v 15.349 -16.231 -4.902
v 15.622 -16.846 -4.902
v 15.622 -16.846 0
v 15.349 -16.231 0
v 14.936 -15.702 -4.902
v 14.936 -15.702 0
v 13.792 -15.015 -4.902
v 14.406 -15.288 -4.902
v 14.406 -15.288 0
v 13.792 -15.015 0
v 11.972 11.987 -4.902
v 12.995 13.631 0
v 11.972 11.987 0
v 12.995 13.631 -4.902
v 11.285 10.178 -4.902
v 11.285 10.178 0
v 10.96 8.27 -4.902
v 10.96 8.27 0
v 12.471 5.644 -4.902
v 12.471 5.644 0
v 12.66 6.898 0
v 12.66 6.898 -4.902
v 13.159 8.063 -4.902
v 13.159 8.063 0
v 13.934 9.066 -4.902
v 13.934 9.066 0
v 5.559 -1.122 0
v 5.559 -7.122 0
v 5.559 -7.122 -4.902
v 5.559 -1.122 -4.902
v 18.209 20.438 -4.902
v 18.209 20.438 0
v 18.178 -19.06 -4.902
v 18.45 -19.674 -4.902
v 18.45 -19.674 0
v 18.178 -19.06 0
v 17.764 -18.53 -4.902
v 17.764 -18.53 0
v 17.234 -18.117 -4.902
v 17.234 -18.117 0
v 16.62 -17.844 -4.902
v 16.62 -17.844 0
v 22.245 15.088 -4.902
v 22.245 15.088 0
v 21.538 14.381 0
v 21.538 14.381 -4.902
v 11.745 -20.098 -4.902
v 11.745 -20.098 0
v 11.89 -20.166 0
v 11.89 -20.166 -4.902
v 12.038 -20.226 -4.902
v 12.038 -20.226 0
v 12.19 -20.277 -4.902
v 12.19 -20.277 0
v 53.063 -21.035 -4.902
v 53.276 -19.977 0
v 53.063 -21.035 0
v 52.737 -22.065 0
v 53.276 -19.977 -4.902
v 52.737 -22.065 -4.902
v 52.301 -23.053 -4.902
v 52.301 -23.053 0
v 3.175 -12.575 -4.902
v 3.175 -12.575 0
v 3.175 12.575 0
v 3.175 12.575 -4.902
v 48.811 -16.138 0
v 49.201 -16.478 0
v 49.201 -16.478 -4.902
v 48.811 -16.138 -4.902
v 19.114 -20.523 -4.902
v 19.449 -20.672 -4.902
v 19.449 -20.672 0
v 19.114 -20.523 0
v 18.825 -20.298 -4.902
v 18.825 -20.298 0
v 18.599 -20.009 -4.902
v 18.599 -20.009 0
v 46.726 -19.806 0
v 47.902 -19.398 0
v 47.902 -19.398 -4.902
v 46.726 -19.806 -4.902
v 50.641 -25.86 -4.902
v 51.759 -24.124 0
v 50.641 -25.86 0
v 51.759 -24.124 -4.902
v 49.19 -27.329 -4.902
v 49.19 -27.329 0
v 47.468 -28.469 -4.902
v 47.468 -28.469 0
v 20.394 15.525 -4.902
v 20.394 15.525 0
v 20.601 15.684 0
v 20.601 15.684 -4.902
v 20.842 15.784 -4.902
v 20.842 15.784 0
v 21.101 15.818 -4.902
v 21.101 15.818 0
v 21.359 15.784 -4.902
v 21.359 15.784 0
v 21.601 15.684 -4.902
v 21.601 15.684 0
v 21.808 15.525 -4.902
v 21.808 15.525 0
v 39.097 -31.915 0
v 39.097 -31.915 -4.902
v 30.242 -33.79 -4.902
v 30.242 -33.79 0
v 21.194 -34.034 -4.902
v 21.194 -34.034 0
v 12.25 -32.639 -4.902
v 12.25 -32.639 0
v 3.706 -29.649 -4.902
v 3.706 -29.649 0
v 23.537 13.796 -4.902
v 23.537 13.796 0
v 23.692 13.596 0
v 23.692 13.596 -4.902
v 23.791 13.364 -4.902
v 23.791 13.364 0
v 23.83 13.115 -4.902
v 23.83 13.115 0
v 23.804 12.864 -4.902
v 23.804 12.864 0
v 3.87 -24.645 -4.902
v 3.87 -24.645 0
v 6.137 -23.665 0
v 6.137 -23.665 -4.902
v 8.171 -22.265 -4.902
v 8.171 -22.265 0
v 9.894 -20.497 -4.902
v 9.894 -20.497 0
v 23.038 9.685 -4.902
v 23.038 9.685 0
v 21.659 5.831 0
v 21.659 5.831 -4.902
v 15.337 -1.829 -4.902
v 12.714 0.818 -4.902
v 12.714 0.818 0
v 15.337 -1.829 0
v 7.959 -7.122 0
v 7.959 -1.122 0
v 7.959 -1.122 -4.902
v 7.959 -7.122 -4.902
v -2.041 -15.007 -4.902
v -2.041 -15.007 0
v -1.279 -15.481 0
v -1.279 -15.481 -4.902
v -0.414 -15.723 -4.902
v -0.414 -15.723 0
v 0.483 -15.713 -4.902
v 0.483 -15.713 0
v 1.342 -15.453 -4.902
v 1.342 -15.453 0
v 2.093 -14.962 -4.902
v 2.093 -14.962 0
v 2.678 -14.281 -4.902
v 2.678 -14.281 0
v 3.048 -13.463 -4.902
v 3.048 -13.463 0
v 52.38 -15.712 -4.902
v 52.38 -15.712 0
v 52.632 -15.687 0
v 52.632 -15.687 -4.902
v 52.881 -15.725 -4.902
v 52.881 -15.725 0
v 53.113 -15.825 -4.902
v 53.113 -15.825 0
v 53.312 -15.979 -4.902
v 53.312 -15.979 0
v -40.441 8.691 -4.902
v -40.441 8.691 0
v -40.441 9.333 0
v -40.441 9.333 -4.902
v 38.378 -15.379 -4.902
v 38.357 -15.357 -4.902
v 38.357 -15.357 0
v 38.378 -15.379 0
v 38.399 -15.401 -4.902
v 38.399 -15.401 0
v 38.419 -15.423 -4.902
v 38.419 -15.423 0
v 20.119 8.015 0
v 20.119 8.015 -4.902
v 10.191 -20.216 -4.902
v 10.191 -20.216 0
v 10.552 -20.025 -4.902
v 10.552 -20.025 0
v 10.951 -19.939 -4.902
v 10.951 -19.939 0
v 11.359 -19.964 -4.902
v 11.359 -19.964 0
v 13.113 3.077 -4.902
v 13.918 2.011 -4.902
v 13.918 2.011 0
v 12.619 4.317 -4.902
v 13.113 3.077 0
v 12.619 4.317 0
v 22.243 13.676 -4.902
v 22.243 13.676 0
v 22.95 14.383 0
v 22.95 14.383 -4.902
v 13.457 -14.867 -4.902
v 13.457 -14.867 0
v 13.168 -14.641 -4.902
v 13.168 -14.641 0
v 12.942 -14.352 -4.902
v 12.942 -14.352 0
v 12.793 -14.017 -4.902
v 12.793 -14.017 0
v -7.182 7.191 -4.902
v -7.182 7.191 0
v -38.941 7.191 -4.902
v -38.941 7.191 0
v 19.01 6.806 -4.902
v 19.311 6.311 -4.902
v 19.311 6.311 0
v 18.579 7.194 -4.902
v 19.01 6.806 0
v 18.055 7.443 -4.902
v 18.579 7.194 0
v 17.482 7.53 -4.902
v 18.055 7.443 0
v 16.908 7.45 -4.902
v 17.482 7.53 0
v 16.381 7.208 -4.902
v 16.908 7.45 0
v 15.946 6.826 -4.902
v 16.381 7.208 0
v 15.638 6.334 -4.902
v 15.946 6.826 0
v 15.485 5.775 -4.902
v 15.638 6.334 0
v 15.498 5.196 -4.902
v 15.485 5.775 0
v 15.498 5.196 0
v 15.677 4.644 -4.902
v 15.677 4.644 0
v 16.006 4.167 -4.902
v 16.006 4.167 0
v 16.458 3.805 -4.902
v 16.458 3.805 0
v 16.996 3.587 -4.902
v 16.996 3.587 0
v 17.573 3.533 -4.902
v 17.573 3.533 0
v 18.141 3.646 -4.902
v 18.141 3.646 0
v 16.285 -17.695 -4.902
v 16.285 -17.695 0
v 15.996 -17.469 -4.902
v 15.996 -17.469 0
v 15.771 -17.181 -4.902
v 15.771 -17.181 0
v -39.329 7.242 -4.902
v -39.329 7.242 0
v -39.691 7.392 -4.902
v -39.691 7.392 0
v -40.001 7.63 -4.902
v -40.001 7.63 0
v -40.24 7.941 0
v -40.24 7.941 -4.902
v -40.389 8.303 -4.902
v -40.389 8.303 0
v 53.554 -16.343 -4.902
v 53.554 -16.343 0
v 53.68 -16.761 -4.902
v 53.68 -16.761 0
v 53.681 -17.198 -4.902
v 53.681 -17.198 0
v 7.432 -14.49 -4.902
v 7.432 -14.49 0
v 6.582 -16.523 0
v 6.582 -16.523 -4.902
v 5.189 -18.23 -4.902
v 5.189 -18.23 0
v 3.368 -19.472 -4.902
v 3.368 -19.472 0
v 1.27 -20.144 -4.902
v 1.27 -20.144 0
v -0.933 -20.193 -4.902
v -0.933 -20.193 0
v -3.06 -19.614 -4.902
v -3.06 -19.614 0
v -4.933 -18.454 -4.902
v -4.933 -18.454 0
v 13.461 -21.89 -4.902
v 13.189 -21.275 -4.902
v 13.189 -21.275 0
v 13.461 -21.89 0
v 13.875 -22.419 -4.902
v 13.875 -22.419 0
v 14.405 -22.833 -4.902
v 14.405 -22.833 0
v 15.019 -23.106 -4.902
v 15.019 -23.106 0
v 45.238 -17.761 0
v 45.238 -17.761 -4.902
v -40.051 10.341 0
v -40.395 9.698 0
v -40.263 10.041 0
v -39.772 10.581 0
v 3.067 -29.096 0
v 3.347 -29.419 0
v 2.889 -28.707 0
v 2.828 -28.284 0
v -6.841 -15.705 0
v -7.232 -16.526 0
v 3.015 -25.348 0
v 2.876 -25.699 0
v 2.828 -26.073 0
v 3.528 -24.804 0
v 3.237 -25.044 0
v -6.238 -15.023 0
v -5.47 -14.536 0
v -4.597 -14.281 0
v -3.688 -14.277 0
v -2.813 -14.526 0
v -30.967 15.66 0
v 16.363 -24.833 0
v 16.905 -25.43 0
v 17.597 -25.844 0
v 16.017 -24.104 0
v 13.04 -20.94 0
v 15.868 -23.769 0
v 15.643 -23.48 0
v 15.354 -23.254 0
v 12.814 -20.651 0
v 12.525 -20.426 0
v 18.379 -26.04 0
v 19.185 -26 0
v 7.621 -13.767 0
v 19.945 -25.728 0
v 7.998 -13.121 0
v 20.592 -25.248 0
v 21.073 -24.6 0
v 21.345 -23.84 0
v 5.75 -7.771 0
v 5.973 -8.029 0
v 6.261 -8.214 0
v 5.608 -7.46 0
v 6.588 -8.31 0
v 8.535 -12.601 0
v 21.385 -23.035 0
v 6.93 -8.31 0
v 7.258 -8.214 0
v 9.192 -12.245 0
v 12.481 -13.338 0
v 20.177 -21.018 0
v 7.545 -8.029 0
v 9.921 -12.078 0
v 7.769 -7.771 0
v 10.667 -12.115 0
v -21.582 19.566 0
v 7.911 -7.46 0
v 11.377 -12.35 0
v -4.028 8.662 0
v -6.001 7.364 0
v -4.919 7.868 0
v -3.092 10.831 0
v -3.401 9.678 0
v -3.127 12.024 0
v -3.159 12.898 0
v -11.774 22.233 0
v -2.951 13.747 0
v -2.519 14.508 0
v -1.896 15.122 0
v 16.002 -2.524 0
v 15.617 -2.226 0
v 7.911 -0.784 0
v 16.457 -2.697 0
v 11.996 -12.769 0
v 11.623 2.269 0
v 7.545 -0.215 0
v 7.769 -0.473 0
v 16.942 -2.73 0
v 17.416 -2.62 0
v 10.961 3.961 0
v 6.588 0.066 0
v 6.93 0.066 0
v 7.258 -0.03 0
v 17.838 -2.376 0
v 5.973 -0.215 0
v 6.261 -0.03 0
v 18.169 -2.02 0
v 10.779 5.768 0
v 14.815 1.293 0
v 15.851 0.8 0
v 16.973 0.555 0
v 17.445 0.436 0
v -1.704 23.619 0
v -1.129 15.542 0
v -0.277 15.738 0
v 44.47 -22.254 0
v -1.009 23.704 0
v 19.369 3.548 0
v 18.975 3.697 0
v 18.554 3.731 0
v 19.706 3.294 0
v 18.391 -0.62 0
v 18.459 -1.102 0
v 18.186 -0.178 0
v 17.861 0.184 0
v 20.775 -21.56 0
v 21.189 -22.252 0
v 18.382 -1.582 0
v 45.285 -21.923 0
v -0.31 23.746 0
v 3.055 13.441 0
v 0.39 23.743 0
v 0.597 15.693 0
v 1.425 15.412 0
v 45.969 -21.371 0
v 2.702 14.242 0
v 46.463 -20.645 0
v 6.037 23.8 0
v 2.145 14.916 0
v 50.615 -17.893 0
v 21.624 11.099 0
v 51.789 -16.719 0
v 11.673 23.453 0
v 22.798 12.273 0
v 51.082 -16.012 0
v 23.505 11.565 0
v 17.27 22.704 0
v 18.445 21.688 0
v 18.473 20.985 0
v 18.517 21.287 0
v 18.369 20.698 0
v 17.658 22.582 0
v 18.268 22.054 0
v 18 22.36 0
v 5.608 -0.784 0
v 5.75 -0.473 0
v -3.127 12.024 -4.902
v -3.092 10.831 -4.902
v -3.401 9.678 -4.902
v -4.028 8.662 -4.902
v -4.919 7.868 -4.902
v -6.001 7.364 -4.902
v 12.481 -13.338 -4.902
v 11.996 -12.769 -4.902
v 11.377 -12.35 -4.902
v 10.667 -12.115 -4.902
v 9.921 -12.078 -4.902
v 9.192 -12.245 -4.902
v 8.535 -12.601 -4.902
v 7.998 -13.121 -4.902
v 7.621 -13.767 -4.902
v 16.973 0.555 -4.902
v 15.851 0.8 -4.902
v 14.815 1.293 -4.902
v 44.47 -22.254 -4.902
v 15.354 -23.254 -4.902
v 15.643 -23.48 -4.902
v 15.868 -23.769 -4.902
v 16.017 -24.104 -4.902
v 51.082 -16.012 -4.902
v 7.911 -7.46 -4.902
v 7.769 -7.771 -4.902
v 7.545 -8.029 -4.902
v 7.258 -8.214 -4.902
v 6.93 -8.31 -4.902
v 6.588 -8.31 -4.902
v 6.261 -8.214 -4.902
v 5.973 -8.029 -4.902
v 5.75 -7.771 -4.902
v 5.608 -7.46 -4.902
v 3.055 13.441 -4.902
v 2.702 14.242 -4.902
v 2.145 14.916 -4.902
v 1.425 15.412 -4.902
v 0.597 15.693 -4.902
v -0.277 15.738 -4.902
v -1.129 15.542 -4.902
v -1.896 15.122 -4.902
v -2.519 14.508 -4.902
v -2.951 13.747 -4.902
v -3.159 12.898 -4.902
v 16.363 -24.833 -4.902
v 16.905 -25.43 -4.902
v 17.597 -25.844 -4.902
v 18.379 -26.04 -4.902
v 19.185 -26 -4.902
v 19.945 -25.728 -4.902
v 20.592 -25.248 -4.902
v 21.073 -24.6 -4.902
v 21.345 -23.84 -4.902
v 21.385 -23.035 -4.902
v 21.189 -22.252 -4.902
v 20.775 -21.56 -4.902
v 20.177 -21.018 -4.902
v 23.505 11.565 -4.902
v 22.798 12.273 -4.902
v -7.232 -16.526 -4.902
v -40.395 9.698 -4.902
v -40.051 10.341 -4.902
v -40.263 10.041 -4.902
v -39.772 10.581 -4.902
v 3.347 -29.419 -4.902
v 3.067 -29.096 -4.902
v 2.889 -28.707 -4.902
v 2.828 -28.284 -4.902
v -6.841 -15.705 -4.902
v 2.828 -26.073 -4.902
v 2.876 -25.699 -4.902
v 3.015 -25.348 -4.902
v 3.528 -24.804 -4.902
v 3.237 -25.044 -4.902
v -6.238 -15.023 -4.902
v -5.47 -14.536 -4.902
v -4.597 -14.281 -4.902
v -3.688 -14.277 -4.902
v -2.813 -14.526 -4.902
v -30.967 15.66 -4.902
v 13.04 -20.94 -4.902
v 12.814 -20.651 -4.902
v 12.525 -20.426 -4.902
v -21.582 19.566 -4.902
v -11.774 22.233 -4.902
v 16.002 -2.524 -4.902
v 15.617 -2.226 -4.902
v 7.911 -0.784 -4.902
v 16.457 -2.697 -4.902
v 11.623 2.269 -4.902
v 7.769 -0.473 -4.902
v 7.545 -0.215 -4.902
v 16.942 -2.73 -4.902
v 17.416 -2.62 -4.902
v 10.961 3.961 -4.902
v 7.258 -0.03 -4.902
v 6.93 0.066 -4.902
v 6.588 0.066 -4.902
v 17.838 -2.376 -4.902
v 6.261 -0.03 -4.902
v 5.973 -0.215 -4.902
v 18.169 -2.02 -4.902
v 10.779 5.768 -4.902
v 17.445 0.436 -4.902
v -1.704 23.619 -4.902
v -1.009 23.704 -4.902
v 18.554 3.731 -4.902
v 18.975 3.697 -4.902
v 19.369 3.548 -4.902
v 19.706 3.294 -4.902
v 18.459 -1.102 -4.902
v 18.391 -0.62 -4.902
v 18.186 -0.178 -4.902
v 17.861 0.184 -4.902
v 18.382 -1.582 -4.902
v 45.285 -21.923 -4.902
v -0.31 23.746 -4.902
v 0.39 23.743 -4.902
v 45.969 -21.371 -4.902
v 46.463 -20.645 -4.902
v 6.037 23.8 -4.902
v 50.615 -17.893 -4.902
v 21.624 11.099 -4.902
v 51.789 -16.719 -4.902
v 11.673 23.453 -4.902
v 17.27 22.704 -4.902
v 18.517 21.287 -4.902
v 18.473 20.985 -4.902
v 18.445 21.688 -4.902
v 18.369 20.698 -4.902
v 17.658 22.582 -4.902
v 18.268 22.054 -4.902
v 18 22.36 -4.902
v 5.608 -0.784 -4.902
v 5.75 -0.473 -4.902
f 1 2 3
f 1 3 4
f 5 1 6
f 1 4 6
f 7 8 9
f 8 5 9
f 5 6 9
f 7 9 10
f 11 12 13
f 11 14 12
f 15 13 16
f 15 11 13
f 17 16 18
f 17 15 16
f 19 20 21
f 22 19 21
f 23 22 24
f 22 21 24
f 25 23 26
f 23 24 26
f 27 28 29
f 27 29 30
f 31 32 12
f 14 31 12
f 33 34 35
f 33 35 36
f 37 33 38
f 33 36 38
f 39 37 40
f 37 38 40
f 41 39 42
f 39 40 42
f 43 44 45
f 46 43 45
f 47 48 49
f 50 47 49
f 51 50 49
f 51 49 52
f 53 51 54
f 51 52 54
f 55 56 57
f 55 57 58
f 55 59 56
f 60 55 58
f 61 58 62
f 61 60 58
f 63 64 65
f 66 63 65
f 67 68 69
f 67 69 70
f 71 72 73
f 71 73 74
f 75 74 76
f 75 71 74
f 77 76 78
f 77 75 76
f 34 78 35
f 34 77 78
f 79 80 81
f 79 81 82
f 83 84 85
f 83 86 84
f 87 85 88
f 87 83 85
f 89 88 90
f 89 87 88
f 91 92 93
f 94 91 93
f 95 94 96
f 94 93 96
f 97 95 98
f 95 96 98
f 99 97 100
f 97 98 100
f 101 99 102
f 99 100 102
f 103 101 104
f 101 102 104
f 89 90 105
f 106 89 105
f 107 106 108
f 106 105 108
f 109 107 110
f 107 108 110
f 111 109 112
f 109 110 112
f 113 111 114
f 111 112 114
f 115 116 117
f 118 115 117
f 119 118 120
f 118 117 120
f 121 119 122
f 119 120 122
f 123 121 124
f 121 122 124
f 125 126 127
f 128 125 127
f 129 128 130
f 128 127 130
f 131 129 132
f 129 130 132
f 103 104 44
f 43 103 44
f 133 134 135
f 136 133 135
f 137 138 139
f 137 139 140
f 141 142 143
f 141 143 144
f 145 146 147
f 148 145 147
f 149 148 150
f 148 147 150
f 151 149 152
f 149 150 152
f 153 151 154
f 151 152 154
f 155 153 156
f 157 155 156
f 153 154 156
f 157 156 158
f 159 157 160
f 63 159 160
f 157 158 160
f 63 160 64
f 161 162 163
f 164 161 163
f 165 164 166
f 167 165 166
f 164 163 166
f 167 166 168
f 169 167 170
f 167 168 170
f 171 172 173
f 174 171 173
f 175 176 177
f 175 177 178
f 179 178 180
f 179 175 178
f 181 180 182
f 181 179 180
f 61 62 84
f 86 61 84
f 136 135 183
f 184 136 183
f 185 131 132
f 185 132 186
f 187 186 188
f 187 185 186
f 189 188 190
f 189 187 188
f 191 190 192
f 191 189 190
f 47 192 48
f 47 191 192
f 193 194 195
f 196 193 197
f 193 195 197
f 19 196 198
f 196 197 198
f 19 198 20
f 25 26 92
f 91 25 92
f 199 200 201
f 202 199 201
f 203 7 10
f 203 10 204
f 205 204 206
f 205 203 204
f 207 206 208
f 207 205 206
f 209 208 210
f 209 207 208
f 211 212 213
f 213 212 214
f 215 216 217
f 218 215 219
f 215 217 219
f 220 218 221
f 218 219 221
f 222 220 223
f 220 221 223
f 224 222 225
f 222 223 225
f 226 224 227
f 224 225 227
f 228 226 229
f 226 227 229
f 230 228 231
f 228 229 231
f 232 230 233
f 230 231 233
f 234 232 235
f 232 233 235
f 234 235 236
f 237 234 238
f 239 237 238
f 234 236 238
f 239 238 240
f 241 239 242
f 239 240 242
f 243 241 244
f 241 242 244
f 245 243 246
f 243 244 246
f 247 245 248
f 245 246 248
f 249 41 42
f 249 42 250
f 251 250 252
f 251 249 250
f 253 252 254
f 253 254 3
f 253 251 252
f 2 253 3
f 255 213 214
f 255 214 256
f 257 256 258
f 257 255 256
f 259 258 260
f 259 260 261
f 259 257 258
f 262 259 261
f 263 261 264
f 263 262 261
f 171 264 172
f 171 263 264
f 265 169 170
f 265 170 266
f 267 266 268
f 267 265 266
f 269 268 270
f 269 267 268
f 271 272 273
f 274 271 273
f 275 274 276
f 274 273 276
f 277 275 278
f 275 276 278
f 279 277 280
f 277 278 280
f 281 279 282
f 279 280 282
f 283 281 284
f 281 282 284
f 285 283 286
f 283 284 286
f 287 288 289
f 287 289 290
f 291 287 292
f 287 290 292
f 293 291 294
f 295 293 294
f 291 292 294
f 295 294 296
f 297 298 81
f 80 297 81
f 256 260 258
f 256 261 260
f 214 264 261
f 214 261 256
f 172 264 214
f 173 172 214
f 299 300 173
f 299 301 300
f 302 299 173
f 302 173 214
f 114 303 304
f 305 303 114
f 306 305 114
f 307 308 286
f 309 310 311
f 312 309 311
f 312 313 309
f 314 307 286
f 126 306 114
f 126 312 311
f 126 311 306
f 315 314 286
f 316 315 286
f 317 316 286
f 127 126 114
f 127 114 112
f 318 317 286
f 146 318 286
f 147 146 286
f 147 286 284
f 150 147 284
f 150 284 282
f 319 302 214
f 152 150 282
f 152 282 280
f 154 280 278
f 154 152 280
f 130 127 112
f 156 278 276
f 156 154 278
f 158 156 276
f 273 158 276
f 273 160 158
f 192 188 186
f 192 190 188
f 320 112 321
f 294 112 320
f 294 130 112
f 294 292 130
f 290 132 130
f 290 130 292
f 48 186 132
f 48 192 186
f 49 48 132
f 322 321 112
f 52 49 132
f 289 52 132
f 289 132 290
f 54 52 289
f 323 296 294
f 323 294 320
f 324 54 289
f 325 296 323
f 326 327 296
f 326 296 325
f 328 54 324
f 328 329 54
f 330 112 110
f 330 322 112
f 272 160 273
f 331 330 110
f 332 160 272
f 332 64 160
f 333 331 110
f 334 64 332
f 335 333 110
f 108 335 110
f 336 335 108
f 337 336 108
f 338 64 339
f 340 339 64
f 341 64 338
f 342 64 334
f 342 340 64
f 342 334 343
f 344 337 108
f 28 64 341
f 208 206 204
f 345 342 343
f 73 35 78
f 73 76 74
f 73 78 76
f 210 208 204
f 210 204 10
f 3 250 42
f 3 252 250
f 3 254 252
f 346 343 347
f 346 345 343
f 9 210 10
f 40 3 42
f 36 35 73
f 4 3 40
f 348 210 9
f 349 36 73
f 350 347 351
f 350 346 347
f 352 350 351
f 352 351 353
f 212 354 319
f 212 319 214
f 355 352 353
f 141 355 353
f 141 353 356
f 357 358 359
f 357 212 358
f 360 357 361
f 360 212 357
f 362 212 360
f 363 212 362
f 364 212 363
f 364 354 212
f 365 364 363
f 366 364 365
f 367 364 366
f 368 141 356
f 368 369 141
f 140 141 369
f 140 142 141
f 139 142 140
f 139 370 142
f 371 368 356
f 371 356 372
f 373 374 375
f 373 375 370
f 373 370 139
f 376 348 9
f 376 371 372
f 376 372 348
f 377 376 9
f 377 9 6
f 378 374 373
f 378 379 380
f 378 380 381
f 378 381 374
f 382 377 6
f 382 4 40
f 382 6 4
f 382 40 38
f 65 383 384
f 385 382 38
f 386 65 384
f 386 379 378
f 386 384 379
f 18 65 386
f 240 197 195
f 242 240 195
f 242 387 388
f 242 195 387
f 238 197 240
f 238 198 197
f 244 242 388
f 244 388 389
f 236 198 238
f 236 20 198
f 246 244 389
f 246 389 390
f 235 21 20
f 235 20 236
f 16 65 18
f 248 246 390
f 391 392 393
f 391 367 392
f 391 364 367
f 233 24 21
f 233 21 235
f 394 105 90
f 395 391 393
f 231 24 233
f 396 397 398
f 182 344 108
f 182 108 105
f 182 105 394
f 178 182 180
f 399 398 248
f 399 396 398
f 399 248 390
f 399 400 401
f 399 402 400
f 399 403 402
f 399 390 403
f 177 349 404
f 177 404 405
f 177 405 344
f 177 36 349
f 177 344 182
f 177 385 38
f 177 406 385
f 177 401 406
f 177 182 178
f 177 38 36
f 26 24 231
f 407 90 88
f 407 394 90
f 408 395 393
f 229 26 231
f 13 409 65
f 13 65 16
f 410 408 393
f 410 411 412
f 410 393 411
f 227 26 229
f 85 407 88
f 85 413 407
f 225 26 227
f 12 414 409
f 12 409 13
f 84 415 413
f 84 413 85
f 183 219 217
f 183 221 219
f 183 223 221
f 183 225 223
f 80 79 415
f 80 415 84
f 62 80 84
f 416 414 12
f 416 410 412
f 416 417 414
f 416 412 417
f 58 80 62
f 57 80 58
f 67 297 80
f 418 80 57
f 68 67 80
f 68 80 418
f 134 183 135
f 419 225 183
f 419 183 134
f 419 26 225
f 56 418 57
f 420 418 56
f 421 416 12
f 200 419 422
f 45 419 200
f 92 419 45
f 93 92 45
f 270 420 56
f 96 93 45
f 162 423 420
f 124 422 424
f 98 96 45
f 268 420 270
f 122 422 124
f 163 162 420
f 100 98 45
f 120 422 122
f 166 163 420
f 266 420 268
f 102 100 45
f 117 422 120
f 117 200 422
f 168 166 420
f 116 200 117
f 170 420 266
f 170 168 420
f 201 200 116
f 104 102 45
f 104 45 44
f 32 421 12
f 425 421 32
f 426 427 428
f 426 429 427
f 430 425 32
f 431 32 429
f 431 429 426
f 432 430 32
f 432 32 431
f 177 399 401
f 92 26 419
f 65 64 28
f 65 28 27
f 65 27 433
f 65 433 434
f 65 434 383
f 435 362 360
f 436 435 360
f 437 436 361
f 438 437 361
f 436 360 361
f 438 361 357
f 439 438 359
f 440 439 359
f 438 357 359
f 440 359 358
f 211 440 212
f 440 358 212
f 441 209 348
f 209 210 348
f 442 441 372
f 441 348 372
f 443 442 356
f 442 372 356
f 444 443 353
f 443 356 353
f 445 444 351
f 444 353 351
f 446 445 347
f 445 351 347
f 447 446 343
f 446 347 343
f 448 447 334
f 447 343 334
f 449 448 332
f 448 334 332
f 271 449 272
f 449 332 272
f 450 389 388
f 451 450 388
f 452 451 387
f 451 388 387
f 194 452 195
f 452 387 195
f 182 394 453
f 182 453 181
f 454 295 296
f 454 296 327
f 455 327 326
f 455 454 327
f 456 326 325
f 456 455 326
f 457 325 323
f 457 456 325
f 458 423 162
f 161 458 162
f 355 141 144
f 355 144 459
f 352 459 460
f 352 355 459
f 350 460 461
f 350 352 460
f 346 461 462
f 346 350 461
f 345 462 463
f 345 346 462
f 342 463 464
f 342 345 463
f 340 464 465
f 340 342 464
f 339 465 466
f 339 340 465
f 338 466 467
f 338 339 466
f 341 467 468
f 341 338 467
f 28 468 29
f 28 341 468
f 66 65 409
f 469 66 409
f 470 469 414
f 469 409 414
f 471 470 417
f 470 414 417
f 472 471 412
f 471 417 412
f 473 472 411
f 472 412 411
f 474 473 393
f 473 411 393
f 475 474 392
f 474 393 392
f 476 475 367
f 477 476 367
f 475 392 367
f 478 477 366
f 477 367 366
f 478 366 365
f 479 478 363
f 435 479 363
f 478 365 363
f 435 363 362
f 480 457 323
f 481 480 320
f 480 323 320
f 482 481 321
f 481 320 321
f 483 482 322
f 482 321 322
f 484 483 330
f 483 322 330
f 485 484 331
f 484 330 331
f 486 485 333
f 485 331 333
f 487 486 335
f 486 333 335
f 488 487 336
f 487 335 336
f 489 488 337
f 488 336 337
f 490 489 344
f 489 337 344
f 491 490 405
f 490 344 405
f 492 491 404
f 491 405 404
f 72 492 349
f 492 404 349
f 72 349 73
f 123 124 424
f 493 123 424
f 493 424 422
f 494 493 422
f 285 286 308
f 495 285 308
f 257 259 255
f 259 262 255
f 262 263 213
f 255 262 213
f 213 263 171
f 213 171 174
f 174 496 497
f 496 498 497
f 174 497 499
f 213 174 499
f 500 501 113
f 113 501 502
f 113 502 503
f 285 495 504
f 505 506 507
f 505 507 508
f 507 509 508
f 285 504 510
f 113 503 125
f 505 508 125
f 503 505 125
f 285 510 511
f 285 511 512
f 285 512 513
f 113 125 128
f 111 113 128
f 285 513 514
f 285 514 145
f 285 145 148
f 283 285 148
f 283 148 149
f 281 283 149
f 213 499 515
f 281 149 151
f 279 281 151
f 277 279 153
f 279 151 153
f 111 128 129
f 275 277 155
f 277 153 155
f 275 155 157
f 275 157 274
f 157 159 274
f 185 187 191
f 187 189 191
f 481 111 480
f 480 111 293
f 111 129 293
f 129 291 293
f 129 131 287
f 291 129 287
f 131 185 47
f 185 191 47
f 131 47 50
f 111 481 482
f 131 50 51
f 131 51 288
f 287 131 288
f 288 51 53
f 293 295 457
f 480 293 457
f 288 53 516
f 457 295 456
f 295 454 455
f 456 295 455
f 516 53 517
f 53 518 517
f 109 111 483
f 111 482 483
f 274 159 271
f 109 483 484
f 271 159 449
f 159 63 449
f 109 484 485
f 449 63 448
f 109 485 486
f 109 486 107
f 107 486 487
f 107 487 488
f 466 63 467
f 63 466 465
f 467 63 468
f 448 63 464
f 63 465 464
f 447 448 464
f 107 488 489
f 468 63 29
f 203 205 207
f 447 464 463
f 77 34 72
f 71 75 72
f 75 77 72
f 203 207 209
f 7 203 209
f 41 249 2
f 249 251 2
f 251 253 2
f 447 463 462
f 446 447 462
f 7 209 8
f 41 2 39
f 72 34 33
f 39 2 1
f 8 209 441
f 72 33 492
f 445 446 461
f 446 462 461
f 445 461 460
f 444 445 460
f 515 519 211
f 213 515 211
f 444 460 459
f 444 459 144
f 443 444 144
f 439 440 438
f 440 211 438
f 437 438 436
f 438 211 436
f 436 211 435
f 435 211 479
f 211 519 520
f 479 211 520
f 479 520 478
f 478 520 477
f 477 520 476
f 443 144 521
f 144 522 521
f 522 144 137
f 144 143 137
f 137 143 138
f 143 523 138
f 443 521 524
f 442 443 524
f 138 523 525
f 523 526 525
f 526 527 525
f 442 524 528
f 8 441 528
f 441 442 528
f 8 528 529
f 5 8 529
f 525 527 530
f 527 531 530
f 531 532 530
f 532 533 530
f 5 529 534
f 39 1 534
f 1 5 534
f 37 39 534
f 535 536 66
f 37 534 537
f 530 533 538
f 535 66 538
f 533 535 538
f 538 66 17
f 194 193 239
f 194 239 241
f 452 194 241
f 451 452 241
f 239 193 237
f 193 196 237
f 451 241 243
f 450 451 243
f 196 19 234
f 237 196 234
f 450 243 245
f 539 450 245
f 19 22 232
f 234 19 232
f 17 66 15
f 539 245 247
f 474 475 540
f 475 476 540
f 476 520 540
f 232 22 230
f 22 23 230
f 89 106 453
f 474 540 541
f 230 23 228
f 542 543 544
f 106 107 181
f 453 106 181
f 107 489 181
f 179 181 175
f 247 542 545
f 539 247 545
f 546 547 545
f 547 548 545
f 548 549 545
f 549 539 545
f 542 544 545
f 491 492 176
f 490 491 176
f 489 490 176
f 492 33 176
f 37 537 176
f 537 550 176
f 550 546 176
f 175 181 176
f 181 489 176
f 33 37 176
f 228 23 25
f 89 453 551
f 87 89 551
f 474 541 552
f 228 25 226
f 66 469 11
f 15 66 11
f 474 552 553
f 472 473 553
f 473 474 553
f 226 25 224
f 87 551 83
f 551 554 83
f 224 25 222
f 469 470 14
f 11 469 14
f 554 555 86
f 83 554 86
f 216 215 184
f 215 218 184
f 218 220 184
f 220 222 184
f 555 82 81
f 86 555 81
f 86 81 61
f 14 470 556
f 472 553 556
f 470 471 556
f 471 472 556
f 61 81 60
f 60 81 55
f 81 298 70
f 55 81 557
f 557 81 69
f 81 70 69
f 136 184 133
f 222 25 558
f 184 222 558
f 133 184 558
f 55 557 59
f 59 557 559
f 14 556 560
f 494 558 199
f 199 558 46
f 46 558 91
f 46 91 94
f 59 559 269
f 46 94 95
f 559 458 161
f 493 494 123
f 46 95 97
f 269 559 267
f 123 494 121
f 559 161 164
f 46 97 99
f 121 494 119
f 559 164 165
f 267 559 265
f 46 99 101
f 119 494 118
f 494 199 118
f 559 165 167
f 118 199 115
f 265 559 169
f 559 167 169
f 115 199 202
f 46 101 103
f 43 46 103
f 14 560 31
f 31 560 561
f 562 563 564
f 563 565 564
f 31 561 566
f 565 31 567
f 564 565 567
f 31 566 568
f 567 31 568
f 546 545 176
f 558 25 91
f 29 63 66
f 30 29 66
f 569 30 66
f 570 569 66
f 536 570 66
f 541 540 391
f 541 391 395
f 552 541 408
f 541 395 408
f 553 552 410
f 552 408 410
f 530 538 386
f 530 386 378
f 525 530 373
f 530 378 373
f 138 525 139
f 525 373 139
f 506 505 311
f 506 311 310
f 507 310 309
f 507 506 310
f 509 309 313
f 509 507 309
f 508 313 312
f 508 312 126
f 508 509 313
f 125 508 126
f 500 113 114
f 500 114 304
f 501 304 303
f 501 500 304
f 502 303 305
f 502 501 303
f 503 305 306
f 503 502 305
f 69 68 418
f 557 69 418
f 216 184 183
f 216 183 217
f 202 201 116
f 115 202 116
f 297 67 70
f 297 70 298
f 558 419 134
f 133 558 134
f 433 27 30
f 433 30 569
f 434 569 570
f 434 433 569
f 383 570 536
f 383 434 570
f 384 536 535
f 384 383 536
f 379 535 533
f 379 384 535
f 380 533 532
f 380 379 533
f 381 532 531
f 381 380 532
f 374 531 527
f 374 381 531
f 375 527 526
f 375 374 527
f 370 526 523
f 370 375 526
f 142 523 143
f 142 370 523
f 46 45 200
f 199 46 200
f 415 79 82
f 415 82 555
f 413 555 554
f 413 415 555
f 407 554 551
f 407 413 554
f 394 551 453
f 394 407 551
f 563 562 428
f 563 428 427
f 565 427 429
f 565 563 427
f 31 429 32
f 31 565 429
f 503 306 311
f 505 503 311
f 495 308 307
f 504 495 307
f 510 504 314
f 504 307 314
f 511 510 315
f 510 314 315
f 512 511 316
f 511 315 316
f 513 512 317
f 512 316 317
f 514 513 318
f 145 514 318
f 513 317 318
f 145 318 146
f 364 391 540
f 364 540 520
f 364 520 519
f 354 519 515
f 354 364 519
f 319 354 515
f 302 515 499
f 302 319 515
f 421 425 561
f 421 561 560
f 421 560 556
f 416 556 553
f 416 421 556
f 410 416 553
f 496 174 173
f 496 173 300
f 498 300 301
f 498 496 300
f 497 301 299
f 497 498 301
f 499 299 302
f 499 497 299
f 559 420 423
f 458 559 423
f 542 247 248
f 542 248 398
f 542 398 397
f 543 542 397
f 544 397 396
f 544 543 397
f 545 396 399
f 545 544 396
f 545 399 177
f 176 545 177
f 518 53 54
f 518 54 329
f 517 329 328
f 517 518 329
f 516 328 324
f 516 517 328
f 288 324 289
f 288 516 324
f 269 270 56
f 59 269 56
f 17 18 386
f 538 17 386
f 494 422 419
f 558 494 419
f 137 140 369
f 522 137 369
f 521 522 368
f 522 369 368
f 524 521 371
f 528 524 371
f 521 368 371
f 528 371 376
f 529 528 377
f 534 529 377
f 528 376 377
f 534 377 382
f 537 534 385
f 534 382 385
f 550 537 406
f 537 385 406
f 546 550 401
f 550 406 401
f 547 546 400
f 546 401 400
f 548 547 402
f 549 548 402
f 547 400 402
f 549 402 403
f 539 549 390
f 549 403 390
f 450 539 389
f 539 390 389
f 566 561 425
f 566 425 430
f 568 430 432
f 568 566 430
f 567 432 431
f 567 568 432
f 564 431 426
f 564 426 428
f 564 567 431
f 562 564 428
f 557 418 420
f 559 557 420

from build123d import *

# Parameters (mm, degrees)
CART_CLIP_DEPTH                    = 4.9022
DEVICE_CLIP_DEPTH                  = 4.9022
JOINT_DEPTH                        = 4.9022
JOINT_FILLETS_R                    = 1
DEVICE_CLIP_FLEX_RELIEF_GEOMETRY_R = 2
DEVICE_CLIP_FLEX_RELIEF_DEPTH      = 62.785838519
SNAP_IN_RELIEF_DEPTH               = 6.35
BOTTOM_BEEFUP_DEPTH                = 4.9022
CABLE_HOLE_R                       = 2.75
CABLE_HOLE_CUT_DEPTH               = 6.35
SHELF_TAIL_DEPTH                   = 4.9022
FRONT_TAB_BEEF_DEPTH               = 4.9022
TOP_CURVE_EXTRUSION_DEPTH          = 4.9022
LPATTERN1_COUNT                    = 4
LPATTERN1_PITCH                    = 4
POSCON_BOTTOM_SNAPBEEF_DEPTH       = 4.9022
POSCON_TOP_CLIP_FLEX_RELIEF_DEPTH  = 6.35
ZIP_TIE_SLOT_DEPTH                 = 6.35
POSCON_BOTTOM_SNAP_RELIEF_DEPTH    = 6.35
SMALL_START                        = -6
SMALL_FILLET_DEPTH                 = 7
POSCON_TOP_SNAP_RELIEF_DEPTH       = 6.35
LARGE_FILLET_R                     = 10


with BuildPart() as part:
    # Cart Clip Geometry → Cart Clip (new body)
    with BuildSketch(Plane.XY):
        with BuildLine():
            Line((11.175, 4.575), (7.675, -8.575))
            Line((7.675, -8.575), (7.675, -12.575))
            ThreePointArc((7.675, -12.575), (3.243595159, -19.530912266), (-4.933394904, -18.454391101))
            Line((-4.933394904, -18.454391101), (-7.231528234, -16.526028272))
            ThreePointArc((-7.231528234, -16.526028272), (-5.042617938, -14.377626523), (-2.040850661, -15.007191107))
            ThreePointArc((-2.040850661, -15.007191107), (1.341812981, -15.452527224), (3.175, -12.575))
            Line((3.175, -12.575), (3.175, 12.575))
            ThreePointArc((3.175, 12.575), (-0.276719483, 15.737918166), (-3.126764616, 12.023667036))
            ThreePointArc((-3.126764616, 12.023667036), (-5.791346514, 7.43274359), (-10.766819067, 9.282405083))
            Line((-10.766819067, 9.282405083), (-11.00522664, 10.634481615))
            ThreePointArc((-11.00522664, 10.634481615), (-0.973965425, 23.707475751), (11.175, 12.575))
            Line((11.175, 12.575), (11.175, 4.575))
        make_face()
    extrude(amount=-CART_CLIP_DEPTH)



with BuildPart() as body_2:
    # Device Clip Geometry → Device Clip (new body)
    with BuildSketch(Plane.XY):
        with BuildLine():
            Line((22.245178849, 15.087875605), (21.538072068, 14.380768824))
            Line((21.538072068, 14.380768824), (22.243106562, 13.67573433))
            Line((22.243106562, 13.67573433), (22.950213344, 14.382841111))
            Line((22.950213344, 14.382841111), (23.537178094, 13.79587636))
            ThreePointArc((23.537178094, 13.79587636), (23.791320059, 13.364452092), (23.804462509, 12.863910072))
            Line((23.804462509, 12.863910072), (23.504826292, 11.565486463))
            Line((23.504826292, 11.565486463), (22.79771951, 12.272593245))
            Line((22.79771951, 12.272593245), (21.623922254, 11.098795988))
            Line((21.623922254, 11.098795988), (23.038135816, 9.684582425))
            Line((23.038135816, 9.684582425), (21.659277593, 5.830850468))
            Line((21.659277593, 5.830850468), (20.24506403, 7.24506403))
            Line((20.24506403, 7.24506403), (18, 5))
            Line((18, 5), (44.516504294, -21.516504294))
            Line((44.516504294, -21.516504294), (46.761568325, -19.271440264))
            Line((46.761568325, -19.271440264), (45.347354762, -17.857226702))
            Line((45.347354762, -17.857226702), (49.20108672, -16.478368479))
            Line((49.20108672, -16.478368479), (50.615300282, -17.892582041))
            Line((50.615300282, -17.892582041), (51.789097539, -16.718784784))
            Line((51.789097539, -16.718784784), (51.081990758, -16.011678003))
            Line((51.081990758, -16.011678003), (52.380414367, -15.712041786))
            ThreePointArc((52.380414367, -15.712041786), (52.880956387, -15.725184235), (53.312380655, -15.9793262))
            Line((53.312380655, -15.9793262), (53.899345406, -16.566290951))
            Line((53.899345406, -16.566290951), (53.192238624, -17.273397732))
            Line((53.192238624, -17.273397732), (53.897273119, -17.978432226))
            Line((53.897273119, -17.978432226), (54.6043799, -17.271325445))
            Line((54.6043799, -17.271325445), (55.041788732, -17.708734278))
            ThreePointArc((55.041788732, -17.708734278), (55.334681951, -18.415841059), (55.041788732, -19.12294784))
            Line((55.041788732, -19.12294784), (48.582368286, -25.582368286))
            ThreePointArc((48.582368286, -25.582368286), (45.04683438, -27.04683438), (41.511300474, -25.582368286))
            Line((41.511300474, -25.582368286), (13.934136008, 1.99479618))
            ThreePointArc((13.934136008, 1.99479618), (12.469669914, 5.530330086), (13.934136008, 9.065863992))
            Line((13.934136008, 9.065863992), (20.393556454, 15.525284438))
            ThreePointArc((20.393556454, 15.525284438), (21.100663236, 15.818177657), (21.807770017, 15.525284438))
            Line((21.807770017, 15.525284438), (22.245178849, 15.087875605))
        make_face()
    extrude(amount=-DEVICE_CLIP_DEPTH)


with BuildPart() as part_1:
    add(part.part)

    add(body_2.part)  # Joint merges body 2
    # Joint Geometry → Joint (add)
    with BuildSketch(Plane.XY):
        Polygon((7.675, -8.575), (41.511300474, -25.582368286), (13.934136008, 1.99479618), (11.175, 4.575), align=None)
    extrude(amount=-JOINT_DEPTH)

    # joint fillets
    # the kernel refuses this fillet: 1 mm, written as the material it adds along each edge
    with BuildSketch(Plane(origin=(7.675, -8.575, 0), x_dir=(0.8934828469815188, -0.44909731924138613, 0), z_dir=(0, 0, -1))) as joint_fillets_piece_1:
        with BuildLine():
            CenterArc((JOINT_FILLETS_R * 1.62185242183, JOINT_FILLETS_R), JOINT_FILLETS_R, 153.314216372, 116.685783628)
            Line((JOINT_FILLETS_R * 0.728369574849, JOINT_FILLETS_R * 1.44909731924), (0, 0))
            Line((0, 0), (JOINT_FILLETS_R * 1.62185242183, 0))
        make_face()
    extrude(amount=4.9022)
    with BuildSketch(Plane(origin=(41.511300474, -25.582368286, 0), x_dir=(-0.8934828469815294, 0.44909731924136537, 0), z_dir=(0, 0, -1))) as joint_fillets_piece_2:
        with BuildLine():
            CenterArc((0.153680417, -1), JOINT_FILLETS_R, 90, 16.706554242)
            ThreePointArc((-0.133789669, -0.042210383), (-0.066746785, -0.02157445), (0, 0))
            Line((0, 0), (0.153680417, 0))
        make_face()
    extrude(amount=4.9022)
    with BuildSketch(Plane(origin=(13.934136008, 1.99479618, 0), x_dir=(-0.7303933527208762, 0.6830267566509803, 0), z_dir=(0, 0, -1))) as joint_fillets_piece_3:
        with BuildLine():
            CenterArc((4.307177284, 1), JOINT_FILLETS_R, 138.225615508, 131.774384492)
            ThreePointArc((3.561403369, 1.66619912), (1.95135729, 0.468333164), (0, 0))
            Line((0, 0), (4.307177284, 0))
        make_face()
    extrude(amount=4.9022)
    with BuildSketch(Plane(origin=(11.175, 4.575, 0), x_dir=(0, 1, 0), z_dir=(0, 0, -1))) as joint_fillets_piece_4:
        with BuildLine():
            CenterArc((JOINT_FILLETS_R * 0.43397607901, JOINT_FILLETS_R), JOINT_FILLETS_R, 223.080619659, 46.919380341)
            Line((-JOINT_FILLETS_R * 0.296417273711, JOINT_FILLETS_R * 0.316973243349), (0, 0))
            Line((0, 0), (JOINT_FILLETS_R * 0.43397607901, 0))
        make_face()
    extrude(amount=4.9022)

    # Device Clip Flex Relief Geometry → Device Clip Flex Relief (cut, through all)
    with BuildSketch(Plane.XY):
        with Locations((17.469669914, 5.530330086)):
            Circle(DEVICE_CLIP_FLEX_RELIEF_GEOMETRY_R)
    extrude(amount=-DEVICE_CLIP_FLEX_RELIEF_DEPTH, mode=Mode.SUBTRACT)

    # Sketch5 → SNAP IN RELIEF (cut)
    with BuildSketch(Plane.XY):
        with BuildLine():
            Line((44.470063399, -22.25362726), (38.389074456, -15.389074456))
            Line((38.389074456, -15.389074456), (46.761568325, -19.271440264))
            ThreePointArc((46.761568325, -19.271440264), (46.141143244, -21.16619399), (44.470063399, -22.25362726))
        make_face()
    extrude(amount=-SNAP_IN_RELIEF_DEPTH, mode=Mode.SUBTRACT)

    # BOTTOM BEEFUP SKETCH → BOTTOM BEEFUP (add)
    with BuildSketch(Plane.XY):
        with BuildLine():
            Line((10.677043667, -13.889484035), (7.526361766, -14.078164518))
            Line((7.526361766, -14.078164518), (7.208614318, -8.772257329))
            Line((7.208614318, -8.772257329), (10.675, -9.282514389))
            Line((10.675, -9.282514389), (44.278748713, -25.488746112))
            Line((44.278748713, -25.488746112), (53.899345406, -16.566290951))
            Line((53.899345406, -16.566290951), (55.041788732, -17.708734278))
            ThreePointArc((55.041788732, -17.708734278), (55.966427661, -19.737585883), (55.333281386, -21.875416975))
            Line((55.333281386, -21.875416975), (50.398436239, -26.810262122))
            ThreePointArc((50.398436239, -26.810262122), (26.922067406, -34.071170743), (2.828292768, -29.238913377))
            Line((2.828292768, -29.238913377), (2.828292768, -24.930419257))
            ThreePointArc((2.828292768, -24.930419257), (8.371790669, -22.091761318), (11.894021473, -16.955397036))
            Line((11.894021473, -16.955397036), (10.677043667, -13.889484035))
        make_face()
    extrude(amount=-BOTTOM_BEEFUP_DEPTH)

    # CABLE HOLE → CABLE HOLE CUT (cut)
    with BuildSketch(Plane.XY):
        with Locations((10.162604388, -14.817796793)):
            Circle(CABLE_HOLE_R)
    cable_hole_cut = extrude(amount=-CABLE_HOLE_CUT_DEPTH, mode=Mode.SUBTRACT)

    # BOX SLIDE BEEF → SHELF TAIL (add)
    with BuildSketch(Plane.XY):
        Polygon((-7.182015159, 7.190807632), (-40.440555285, 7.190807632), (-40.440555285, 10.131018627), (-4.155347731, 22.948702822), align=None)
    extrude(amount=-SHELF_TAIL_DEPTH)

    # BEHIND TOP CLIP BEEF SKETCH → FRONT TAB BEEF (add)
    with BuildSketch(Plane.XY):
        Polygon((18.518382836, 20.841188896), (11.175, 11.254753066), (0.590090247, 23.734409415), (18.518382836, 22.48088631), align=None)
    extrude(amount=-FRONT_TAB_BEEF_DEPTH)

    # TOP CURVE → TOP CURVE EXTRUSION (add)
    with BuildSketch(Plane.XY):
        with BuildLine():
            Line((-40.440555285, 10.131018627), (-38.751141722, 8.751938886))
            Line((-38.751141722, 8.751938886), (0, 16.86846238))
            Line((0, 16.86846238), (13.175622622, 16.86846238))
            Line((13.175622622, 16.86846238), (18.518382836, 22.48088631))
            ThreePointArc((18.518382836, 22.48088631), (-12.184902527, 22.148517873), (-40.440555285, 10.131018627))
        make_face()
    extrude(amount=-TOP_CURVE_EXTRUSION_DEPTH)

    # LPattern1: CABLE HOLE CUT ×4
    with Locations(*[Vector(0.7071067811865482, -0.7071067811865469, 0) * (i * LPATTERN1_PITCH) for i in range(1, LPATTERN1_COUNT)]):
        add(cable_hole_cut, mode=Mode.SUBTRACT)

    # Sketch13 → POSCON BOTTOM SNAPBEEF (add)
    with BuildSketch(Plane.XY):
        Polygon((49.20108672, -16.478368479), (48.811303545, -16.138109098), (45.23751859, -17.761345734), (45.347354762, -17.857226702), align=None)
    extrude(amount=-POSCON_BOTTOM_SNAPBEEF_DEPTH)

    # Sketch14 → POSCON TOP CLIP FLEX RELIEF (cut)
    with BuildSketch(Plane.XY):
        with BuildLine():
            Line((12.714084889, 0.817871011), (15.336641714, -1.828686076))
            ThreePointArc((15.336641714, -1.828686076), (18.169119991, -2.019659869), (16.973164436, 0.555042927))
            ThreePointArc((16.973164436, 0.555042927), (15.318693794, 1.016650685), (13.918068864, 2.010936675))
            ThreePointArc((13.918068864, 2.010936675), (12.824536262, 3.680267019), (12.470969242, 5.644310734))
            Line((12.470969242, 5.644310734), (11.175, 11.254753066))
            Line((11.175, 11.254753066), (10.778900507, 5.767952045))
            ThreePointArc((10.778900507, 5.767952045), (11.234240257, 3.092651589), (12.714084889, 0.817871011))
        make_face()
    extrude(amount=-POSCON_TOP_CLIP_FLEX_RELIEF_DEPTH, mode=Mode.SUBTRACT)

    # Sketch15 → ZIP TIE SLOT (cut)
    with BuildSketch(Plane.XY):
        with BuildLine():
            Line((7.959147306, -1.122008403), (7.959147306, -7.122008403))
            ThreePointArc((7.959147306, -7.122008403), (6.759147306, -8.322008403), (5.559147306, -7.122008403))
            Line((5.559147306, -7.122008403), (5.559147306, -1.122008403))
            ThreePointArc((5.559147306, -1.122008403), (6.759147306, 0.077991597), (7.959147306, -1.122008403))
        make_face()
    extrude(amount=-ZIP_TIE_SLOT_DEPTH, mode=Mode.SUBTRACT)

    # Sketch16 → POSCON BOTTOM SNAP RELIEF (cut)
    with BuildSketch(Plane.XY):
        Polygon((45.23751859, -17.761345734), (47.901521822, -19.397502687), (45.962169994, -20.070838595), align=None)
        Polygon((53.788847446, -16.455792992), (53.040140925, -21.594507061), (50.398436239, -26.810262122), (52.008012569, -28.207638953), (59.817475223, -20.235408925), align=None)
    extrude(amount=-POSCON_BOTTOM_SNAP_RELIEF_DEPTH, mode=Mode.SUBTRACT)

    # SMALL FILLET: read off the stored shape, not the designer's step
    # SMALL FILLET outline → SMALL FILLET (cut)
    with BuildSketch(Plane.XY.offset(SMALL_START)):
        with BuildLine():
            ThreePointArc((12.911452732, -14.897375574), (13.356384308, -14.920601542), (13.791725956, -15.015370746))
            ThreePointArc((13.791725956, -15.015370746), (13.167808208, -14.641020097), (12.793457559, -14.017102349))
            ThreePointArc((12.793457559, -14.017102349), (12.888226764, -14.452443998), (12.911452732, -14.897375574))
        make_face()
        with BuildLine():
            ThreePointArc((15.739879856, -17.725802698), (16.184811432, -17.749028666), (16.620153081, -17.843797871))
            ThreePointArc((16.620153081, -17.843797871), (15.996235332, -17.469447223), (15.621884684, -16.845529474))
            ThreePointArc((15.621884684, -16.845529474), (15.716653888, -17.280871122), (15.739879856, -17.725802698))
        make_face()
        with BuildLine():
            ThreePointArc((18.568306981, -20.554229823), (19.013238557, -20.577455791), (19.448580205, -20.672224996))
            ThreePointArc((19.448580205, -20.672224996), (18.824662457, -20.297874347), (18.450311808, -19.673956599))
            ThreePointArc((18.450311808, -19.673956599), (18.545081013, -20.109298247), (18.568306981, -20.554229823))
        make_face()
        with BuildLine():
            ThreePointArc((15.899037418, -23.223499386), (15.454105842, -23.200273418), (15.018764194, -23.105504213))
            ThreePointArc((15.018764194, -23.105504213), (15.642681942, -23.479854862), (16.017032591, -24.10377261))
            ThreePointArc((16.017032591, -24.10377261), (15.922263386, -23.668430962), (15.899037418, -23.223499386))
        make_face()
        with BuildLine():
            ThreePointArc((13.070610293, -20.395072261), (12.625678717, -20.371846293), (12.190337069, -20.277077088))
            ThreePointArc((12.190337069, -20.277077088), (12.814254818, -20.651427738), (13.188605466, -21.275345486))
            ThreePointArc((13.188605466, -21.275345486), (13.093836261, -20.840003837), (13.070610293, -20.395072261))
        make_face()
        with BuildLine():
            ThreePointArc((10.766719879, -19.263300835), (10.34883576, -19.893280086), (9.89413768, -20.497225986))
            ThreePointArc((9.89413768, -20.497225986), (10.748460388, -19.968555953), (11.744802711, -20.097634486))
            ThreePointArc((11.744802711, -20.097634486), (11.206321204, -19.738425894), (10.766719879, -19.263300835))
        make_face()
        with BuildLine():
            Line((2.828292768, -24.930419257), (2.828292768, -26.073018622))
            ThreePointArc((2.828292768, -26.073018622), (3.116469638, -25.189002389), (3.870272369, -24.644656863))
            ThreePointArc((3.870272369, -24.644656863), (3.352328856, -24.798645783), (2.828292768, -24.930419257))
        make_face()
        with BuildLine():
            ThreePointArc((3.706478432, -29.649302789), (3.066801289, -29.09582405), (2.828292768, -28.284258126))
            Line((2.828292768, -28.284258126), (2.828292768, -29.238913377))
            ThreePointArc((2.828292768, -29.238913377), (3.266388444, -29.446241882), (3.706478432, -29.649302789))
        make_face()
        with BuildLine():
            ThreePointArc((53.312380655, -15.9793262), (53.632233061, -16.547589912), (53.680725913, -17.197880348))
            Line((53.680725913, -17.197880348), (53.788847446, -16.455792992))
            Line((53.788847446, -16.455792992), (53.312380655, -15.9793262))
        make_face()
        with BuildLine():
            ThreePointArc((18.517090684, 21.287433062), (18.42867623, 20.838728265), (18.20916522, 20.437520055))
            Line((18.20916522, 20.437520055), (18.518382836, 20.841188896))
            Line((18.518382836, 20.841188896), (18.518382836, 22.48088631))
            ThreePointArc((18.518382836, 22.48088631), (17.894812545, 22.594883631), (17.270347278, 22.703871827))
            ThreePointArc((17.270347278, 22.703871827), (18.144343786, 22.216251337), (18.517090684, 21.287433062))
        make_face()
        with BuildLine():
            ThreePointArc((-38.940555285, 7.190807632), (-40.001215457, 7.63014746), (-40.440555285, 8.690807632))
            Line((-40.440555285, 8.690807632), (-40.440555285, 7.190807632))
            Line((-40.440555285, 7.190807632), (-38.940555285, 7.190807632))
        make_face()
        with BuildLine():
            ThreePointArc((-40.440555285, 9.332781992), (-40.262919659, 10.040844462), (-39.772085336, 10.581204106))
            ThreePointArc((-39.772085336, 10.581204106), (-40.106894609, 10.356964129), (-40.440555285, 10.131018627))
            Line((-40.440555285, 10.131018627), (-40.440555285, 9.332781992))
        make_face()
        with BuildLine():
            Line((38.389074456, -15.389074456), (38.357004142, -15.357004142))
            ThreePointArc((38.357004142, -15.357004142), (38.388575297, -15.389544316), (38.419148588, -15.423023781))
            Line((38.419148588, -15.423023781), (38.389074456, -15.389074456))
        make_face()
        with BuildLine():
            ThreePointArc((18.141331517, 3.646485429), (18.974552467, 3.696970103), (19.705737892, 3.294262108))
            Line((19.705737892, 3.294262108), (18.883883476, 4.116116524))
            ThreePointArc((18.883883476, 4.116116524), (18.538714881, 3.840021577), (18.141331517, 3.646485429))
        make_face()
    extrude(amount=SMALL_FILLET_DEPTH, mode=Mode.SUBTRACT)

    # Sketch12 → POSCON TOP SNAP RELIEF (cut)
    with BuildSketch(Plane.XY):
        Polygon((21.659277593, 5.830850468), (20.119072518, 8.015253176), (19.31101106, 6.31101106), align=None)
    extrude(amount=-POSCON_TOP_SNAP_RELIEF_DEPTH, mode=Mode.SUBTRACT)

    # LARGE FILLET
    large_fillet_edges = [part_1.edges().sort_by_distance(p)[0] for p in [
        (50.398436239, -26.810262122, -2.4511),
        (11.175, 11.254753066, -2.4511),
        (53.040140925, -21.594507061, -2.4511),
    ]]
    fillet(large_fillet_edges, radius=LARGE_FILLET_R)


solid = part_1.part
